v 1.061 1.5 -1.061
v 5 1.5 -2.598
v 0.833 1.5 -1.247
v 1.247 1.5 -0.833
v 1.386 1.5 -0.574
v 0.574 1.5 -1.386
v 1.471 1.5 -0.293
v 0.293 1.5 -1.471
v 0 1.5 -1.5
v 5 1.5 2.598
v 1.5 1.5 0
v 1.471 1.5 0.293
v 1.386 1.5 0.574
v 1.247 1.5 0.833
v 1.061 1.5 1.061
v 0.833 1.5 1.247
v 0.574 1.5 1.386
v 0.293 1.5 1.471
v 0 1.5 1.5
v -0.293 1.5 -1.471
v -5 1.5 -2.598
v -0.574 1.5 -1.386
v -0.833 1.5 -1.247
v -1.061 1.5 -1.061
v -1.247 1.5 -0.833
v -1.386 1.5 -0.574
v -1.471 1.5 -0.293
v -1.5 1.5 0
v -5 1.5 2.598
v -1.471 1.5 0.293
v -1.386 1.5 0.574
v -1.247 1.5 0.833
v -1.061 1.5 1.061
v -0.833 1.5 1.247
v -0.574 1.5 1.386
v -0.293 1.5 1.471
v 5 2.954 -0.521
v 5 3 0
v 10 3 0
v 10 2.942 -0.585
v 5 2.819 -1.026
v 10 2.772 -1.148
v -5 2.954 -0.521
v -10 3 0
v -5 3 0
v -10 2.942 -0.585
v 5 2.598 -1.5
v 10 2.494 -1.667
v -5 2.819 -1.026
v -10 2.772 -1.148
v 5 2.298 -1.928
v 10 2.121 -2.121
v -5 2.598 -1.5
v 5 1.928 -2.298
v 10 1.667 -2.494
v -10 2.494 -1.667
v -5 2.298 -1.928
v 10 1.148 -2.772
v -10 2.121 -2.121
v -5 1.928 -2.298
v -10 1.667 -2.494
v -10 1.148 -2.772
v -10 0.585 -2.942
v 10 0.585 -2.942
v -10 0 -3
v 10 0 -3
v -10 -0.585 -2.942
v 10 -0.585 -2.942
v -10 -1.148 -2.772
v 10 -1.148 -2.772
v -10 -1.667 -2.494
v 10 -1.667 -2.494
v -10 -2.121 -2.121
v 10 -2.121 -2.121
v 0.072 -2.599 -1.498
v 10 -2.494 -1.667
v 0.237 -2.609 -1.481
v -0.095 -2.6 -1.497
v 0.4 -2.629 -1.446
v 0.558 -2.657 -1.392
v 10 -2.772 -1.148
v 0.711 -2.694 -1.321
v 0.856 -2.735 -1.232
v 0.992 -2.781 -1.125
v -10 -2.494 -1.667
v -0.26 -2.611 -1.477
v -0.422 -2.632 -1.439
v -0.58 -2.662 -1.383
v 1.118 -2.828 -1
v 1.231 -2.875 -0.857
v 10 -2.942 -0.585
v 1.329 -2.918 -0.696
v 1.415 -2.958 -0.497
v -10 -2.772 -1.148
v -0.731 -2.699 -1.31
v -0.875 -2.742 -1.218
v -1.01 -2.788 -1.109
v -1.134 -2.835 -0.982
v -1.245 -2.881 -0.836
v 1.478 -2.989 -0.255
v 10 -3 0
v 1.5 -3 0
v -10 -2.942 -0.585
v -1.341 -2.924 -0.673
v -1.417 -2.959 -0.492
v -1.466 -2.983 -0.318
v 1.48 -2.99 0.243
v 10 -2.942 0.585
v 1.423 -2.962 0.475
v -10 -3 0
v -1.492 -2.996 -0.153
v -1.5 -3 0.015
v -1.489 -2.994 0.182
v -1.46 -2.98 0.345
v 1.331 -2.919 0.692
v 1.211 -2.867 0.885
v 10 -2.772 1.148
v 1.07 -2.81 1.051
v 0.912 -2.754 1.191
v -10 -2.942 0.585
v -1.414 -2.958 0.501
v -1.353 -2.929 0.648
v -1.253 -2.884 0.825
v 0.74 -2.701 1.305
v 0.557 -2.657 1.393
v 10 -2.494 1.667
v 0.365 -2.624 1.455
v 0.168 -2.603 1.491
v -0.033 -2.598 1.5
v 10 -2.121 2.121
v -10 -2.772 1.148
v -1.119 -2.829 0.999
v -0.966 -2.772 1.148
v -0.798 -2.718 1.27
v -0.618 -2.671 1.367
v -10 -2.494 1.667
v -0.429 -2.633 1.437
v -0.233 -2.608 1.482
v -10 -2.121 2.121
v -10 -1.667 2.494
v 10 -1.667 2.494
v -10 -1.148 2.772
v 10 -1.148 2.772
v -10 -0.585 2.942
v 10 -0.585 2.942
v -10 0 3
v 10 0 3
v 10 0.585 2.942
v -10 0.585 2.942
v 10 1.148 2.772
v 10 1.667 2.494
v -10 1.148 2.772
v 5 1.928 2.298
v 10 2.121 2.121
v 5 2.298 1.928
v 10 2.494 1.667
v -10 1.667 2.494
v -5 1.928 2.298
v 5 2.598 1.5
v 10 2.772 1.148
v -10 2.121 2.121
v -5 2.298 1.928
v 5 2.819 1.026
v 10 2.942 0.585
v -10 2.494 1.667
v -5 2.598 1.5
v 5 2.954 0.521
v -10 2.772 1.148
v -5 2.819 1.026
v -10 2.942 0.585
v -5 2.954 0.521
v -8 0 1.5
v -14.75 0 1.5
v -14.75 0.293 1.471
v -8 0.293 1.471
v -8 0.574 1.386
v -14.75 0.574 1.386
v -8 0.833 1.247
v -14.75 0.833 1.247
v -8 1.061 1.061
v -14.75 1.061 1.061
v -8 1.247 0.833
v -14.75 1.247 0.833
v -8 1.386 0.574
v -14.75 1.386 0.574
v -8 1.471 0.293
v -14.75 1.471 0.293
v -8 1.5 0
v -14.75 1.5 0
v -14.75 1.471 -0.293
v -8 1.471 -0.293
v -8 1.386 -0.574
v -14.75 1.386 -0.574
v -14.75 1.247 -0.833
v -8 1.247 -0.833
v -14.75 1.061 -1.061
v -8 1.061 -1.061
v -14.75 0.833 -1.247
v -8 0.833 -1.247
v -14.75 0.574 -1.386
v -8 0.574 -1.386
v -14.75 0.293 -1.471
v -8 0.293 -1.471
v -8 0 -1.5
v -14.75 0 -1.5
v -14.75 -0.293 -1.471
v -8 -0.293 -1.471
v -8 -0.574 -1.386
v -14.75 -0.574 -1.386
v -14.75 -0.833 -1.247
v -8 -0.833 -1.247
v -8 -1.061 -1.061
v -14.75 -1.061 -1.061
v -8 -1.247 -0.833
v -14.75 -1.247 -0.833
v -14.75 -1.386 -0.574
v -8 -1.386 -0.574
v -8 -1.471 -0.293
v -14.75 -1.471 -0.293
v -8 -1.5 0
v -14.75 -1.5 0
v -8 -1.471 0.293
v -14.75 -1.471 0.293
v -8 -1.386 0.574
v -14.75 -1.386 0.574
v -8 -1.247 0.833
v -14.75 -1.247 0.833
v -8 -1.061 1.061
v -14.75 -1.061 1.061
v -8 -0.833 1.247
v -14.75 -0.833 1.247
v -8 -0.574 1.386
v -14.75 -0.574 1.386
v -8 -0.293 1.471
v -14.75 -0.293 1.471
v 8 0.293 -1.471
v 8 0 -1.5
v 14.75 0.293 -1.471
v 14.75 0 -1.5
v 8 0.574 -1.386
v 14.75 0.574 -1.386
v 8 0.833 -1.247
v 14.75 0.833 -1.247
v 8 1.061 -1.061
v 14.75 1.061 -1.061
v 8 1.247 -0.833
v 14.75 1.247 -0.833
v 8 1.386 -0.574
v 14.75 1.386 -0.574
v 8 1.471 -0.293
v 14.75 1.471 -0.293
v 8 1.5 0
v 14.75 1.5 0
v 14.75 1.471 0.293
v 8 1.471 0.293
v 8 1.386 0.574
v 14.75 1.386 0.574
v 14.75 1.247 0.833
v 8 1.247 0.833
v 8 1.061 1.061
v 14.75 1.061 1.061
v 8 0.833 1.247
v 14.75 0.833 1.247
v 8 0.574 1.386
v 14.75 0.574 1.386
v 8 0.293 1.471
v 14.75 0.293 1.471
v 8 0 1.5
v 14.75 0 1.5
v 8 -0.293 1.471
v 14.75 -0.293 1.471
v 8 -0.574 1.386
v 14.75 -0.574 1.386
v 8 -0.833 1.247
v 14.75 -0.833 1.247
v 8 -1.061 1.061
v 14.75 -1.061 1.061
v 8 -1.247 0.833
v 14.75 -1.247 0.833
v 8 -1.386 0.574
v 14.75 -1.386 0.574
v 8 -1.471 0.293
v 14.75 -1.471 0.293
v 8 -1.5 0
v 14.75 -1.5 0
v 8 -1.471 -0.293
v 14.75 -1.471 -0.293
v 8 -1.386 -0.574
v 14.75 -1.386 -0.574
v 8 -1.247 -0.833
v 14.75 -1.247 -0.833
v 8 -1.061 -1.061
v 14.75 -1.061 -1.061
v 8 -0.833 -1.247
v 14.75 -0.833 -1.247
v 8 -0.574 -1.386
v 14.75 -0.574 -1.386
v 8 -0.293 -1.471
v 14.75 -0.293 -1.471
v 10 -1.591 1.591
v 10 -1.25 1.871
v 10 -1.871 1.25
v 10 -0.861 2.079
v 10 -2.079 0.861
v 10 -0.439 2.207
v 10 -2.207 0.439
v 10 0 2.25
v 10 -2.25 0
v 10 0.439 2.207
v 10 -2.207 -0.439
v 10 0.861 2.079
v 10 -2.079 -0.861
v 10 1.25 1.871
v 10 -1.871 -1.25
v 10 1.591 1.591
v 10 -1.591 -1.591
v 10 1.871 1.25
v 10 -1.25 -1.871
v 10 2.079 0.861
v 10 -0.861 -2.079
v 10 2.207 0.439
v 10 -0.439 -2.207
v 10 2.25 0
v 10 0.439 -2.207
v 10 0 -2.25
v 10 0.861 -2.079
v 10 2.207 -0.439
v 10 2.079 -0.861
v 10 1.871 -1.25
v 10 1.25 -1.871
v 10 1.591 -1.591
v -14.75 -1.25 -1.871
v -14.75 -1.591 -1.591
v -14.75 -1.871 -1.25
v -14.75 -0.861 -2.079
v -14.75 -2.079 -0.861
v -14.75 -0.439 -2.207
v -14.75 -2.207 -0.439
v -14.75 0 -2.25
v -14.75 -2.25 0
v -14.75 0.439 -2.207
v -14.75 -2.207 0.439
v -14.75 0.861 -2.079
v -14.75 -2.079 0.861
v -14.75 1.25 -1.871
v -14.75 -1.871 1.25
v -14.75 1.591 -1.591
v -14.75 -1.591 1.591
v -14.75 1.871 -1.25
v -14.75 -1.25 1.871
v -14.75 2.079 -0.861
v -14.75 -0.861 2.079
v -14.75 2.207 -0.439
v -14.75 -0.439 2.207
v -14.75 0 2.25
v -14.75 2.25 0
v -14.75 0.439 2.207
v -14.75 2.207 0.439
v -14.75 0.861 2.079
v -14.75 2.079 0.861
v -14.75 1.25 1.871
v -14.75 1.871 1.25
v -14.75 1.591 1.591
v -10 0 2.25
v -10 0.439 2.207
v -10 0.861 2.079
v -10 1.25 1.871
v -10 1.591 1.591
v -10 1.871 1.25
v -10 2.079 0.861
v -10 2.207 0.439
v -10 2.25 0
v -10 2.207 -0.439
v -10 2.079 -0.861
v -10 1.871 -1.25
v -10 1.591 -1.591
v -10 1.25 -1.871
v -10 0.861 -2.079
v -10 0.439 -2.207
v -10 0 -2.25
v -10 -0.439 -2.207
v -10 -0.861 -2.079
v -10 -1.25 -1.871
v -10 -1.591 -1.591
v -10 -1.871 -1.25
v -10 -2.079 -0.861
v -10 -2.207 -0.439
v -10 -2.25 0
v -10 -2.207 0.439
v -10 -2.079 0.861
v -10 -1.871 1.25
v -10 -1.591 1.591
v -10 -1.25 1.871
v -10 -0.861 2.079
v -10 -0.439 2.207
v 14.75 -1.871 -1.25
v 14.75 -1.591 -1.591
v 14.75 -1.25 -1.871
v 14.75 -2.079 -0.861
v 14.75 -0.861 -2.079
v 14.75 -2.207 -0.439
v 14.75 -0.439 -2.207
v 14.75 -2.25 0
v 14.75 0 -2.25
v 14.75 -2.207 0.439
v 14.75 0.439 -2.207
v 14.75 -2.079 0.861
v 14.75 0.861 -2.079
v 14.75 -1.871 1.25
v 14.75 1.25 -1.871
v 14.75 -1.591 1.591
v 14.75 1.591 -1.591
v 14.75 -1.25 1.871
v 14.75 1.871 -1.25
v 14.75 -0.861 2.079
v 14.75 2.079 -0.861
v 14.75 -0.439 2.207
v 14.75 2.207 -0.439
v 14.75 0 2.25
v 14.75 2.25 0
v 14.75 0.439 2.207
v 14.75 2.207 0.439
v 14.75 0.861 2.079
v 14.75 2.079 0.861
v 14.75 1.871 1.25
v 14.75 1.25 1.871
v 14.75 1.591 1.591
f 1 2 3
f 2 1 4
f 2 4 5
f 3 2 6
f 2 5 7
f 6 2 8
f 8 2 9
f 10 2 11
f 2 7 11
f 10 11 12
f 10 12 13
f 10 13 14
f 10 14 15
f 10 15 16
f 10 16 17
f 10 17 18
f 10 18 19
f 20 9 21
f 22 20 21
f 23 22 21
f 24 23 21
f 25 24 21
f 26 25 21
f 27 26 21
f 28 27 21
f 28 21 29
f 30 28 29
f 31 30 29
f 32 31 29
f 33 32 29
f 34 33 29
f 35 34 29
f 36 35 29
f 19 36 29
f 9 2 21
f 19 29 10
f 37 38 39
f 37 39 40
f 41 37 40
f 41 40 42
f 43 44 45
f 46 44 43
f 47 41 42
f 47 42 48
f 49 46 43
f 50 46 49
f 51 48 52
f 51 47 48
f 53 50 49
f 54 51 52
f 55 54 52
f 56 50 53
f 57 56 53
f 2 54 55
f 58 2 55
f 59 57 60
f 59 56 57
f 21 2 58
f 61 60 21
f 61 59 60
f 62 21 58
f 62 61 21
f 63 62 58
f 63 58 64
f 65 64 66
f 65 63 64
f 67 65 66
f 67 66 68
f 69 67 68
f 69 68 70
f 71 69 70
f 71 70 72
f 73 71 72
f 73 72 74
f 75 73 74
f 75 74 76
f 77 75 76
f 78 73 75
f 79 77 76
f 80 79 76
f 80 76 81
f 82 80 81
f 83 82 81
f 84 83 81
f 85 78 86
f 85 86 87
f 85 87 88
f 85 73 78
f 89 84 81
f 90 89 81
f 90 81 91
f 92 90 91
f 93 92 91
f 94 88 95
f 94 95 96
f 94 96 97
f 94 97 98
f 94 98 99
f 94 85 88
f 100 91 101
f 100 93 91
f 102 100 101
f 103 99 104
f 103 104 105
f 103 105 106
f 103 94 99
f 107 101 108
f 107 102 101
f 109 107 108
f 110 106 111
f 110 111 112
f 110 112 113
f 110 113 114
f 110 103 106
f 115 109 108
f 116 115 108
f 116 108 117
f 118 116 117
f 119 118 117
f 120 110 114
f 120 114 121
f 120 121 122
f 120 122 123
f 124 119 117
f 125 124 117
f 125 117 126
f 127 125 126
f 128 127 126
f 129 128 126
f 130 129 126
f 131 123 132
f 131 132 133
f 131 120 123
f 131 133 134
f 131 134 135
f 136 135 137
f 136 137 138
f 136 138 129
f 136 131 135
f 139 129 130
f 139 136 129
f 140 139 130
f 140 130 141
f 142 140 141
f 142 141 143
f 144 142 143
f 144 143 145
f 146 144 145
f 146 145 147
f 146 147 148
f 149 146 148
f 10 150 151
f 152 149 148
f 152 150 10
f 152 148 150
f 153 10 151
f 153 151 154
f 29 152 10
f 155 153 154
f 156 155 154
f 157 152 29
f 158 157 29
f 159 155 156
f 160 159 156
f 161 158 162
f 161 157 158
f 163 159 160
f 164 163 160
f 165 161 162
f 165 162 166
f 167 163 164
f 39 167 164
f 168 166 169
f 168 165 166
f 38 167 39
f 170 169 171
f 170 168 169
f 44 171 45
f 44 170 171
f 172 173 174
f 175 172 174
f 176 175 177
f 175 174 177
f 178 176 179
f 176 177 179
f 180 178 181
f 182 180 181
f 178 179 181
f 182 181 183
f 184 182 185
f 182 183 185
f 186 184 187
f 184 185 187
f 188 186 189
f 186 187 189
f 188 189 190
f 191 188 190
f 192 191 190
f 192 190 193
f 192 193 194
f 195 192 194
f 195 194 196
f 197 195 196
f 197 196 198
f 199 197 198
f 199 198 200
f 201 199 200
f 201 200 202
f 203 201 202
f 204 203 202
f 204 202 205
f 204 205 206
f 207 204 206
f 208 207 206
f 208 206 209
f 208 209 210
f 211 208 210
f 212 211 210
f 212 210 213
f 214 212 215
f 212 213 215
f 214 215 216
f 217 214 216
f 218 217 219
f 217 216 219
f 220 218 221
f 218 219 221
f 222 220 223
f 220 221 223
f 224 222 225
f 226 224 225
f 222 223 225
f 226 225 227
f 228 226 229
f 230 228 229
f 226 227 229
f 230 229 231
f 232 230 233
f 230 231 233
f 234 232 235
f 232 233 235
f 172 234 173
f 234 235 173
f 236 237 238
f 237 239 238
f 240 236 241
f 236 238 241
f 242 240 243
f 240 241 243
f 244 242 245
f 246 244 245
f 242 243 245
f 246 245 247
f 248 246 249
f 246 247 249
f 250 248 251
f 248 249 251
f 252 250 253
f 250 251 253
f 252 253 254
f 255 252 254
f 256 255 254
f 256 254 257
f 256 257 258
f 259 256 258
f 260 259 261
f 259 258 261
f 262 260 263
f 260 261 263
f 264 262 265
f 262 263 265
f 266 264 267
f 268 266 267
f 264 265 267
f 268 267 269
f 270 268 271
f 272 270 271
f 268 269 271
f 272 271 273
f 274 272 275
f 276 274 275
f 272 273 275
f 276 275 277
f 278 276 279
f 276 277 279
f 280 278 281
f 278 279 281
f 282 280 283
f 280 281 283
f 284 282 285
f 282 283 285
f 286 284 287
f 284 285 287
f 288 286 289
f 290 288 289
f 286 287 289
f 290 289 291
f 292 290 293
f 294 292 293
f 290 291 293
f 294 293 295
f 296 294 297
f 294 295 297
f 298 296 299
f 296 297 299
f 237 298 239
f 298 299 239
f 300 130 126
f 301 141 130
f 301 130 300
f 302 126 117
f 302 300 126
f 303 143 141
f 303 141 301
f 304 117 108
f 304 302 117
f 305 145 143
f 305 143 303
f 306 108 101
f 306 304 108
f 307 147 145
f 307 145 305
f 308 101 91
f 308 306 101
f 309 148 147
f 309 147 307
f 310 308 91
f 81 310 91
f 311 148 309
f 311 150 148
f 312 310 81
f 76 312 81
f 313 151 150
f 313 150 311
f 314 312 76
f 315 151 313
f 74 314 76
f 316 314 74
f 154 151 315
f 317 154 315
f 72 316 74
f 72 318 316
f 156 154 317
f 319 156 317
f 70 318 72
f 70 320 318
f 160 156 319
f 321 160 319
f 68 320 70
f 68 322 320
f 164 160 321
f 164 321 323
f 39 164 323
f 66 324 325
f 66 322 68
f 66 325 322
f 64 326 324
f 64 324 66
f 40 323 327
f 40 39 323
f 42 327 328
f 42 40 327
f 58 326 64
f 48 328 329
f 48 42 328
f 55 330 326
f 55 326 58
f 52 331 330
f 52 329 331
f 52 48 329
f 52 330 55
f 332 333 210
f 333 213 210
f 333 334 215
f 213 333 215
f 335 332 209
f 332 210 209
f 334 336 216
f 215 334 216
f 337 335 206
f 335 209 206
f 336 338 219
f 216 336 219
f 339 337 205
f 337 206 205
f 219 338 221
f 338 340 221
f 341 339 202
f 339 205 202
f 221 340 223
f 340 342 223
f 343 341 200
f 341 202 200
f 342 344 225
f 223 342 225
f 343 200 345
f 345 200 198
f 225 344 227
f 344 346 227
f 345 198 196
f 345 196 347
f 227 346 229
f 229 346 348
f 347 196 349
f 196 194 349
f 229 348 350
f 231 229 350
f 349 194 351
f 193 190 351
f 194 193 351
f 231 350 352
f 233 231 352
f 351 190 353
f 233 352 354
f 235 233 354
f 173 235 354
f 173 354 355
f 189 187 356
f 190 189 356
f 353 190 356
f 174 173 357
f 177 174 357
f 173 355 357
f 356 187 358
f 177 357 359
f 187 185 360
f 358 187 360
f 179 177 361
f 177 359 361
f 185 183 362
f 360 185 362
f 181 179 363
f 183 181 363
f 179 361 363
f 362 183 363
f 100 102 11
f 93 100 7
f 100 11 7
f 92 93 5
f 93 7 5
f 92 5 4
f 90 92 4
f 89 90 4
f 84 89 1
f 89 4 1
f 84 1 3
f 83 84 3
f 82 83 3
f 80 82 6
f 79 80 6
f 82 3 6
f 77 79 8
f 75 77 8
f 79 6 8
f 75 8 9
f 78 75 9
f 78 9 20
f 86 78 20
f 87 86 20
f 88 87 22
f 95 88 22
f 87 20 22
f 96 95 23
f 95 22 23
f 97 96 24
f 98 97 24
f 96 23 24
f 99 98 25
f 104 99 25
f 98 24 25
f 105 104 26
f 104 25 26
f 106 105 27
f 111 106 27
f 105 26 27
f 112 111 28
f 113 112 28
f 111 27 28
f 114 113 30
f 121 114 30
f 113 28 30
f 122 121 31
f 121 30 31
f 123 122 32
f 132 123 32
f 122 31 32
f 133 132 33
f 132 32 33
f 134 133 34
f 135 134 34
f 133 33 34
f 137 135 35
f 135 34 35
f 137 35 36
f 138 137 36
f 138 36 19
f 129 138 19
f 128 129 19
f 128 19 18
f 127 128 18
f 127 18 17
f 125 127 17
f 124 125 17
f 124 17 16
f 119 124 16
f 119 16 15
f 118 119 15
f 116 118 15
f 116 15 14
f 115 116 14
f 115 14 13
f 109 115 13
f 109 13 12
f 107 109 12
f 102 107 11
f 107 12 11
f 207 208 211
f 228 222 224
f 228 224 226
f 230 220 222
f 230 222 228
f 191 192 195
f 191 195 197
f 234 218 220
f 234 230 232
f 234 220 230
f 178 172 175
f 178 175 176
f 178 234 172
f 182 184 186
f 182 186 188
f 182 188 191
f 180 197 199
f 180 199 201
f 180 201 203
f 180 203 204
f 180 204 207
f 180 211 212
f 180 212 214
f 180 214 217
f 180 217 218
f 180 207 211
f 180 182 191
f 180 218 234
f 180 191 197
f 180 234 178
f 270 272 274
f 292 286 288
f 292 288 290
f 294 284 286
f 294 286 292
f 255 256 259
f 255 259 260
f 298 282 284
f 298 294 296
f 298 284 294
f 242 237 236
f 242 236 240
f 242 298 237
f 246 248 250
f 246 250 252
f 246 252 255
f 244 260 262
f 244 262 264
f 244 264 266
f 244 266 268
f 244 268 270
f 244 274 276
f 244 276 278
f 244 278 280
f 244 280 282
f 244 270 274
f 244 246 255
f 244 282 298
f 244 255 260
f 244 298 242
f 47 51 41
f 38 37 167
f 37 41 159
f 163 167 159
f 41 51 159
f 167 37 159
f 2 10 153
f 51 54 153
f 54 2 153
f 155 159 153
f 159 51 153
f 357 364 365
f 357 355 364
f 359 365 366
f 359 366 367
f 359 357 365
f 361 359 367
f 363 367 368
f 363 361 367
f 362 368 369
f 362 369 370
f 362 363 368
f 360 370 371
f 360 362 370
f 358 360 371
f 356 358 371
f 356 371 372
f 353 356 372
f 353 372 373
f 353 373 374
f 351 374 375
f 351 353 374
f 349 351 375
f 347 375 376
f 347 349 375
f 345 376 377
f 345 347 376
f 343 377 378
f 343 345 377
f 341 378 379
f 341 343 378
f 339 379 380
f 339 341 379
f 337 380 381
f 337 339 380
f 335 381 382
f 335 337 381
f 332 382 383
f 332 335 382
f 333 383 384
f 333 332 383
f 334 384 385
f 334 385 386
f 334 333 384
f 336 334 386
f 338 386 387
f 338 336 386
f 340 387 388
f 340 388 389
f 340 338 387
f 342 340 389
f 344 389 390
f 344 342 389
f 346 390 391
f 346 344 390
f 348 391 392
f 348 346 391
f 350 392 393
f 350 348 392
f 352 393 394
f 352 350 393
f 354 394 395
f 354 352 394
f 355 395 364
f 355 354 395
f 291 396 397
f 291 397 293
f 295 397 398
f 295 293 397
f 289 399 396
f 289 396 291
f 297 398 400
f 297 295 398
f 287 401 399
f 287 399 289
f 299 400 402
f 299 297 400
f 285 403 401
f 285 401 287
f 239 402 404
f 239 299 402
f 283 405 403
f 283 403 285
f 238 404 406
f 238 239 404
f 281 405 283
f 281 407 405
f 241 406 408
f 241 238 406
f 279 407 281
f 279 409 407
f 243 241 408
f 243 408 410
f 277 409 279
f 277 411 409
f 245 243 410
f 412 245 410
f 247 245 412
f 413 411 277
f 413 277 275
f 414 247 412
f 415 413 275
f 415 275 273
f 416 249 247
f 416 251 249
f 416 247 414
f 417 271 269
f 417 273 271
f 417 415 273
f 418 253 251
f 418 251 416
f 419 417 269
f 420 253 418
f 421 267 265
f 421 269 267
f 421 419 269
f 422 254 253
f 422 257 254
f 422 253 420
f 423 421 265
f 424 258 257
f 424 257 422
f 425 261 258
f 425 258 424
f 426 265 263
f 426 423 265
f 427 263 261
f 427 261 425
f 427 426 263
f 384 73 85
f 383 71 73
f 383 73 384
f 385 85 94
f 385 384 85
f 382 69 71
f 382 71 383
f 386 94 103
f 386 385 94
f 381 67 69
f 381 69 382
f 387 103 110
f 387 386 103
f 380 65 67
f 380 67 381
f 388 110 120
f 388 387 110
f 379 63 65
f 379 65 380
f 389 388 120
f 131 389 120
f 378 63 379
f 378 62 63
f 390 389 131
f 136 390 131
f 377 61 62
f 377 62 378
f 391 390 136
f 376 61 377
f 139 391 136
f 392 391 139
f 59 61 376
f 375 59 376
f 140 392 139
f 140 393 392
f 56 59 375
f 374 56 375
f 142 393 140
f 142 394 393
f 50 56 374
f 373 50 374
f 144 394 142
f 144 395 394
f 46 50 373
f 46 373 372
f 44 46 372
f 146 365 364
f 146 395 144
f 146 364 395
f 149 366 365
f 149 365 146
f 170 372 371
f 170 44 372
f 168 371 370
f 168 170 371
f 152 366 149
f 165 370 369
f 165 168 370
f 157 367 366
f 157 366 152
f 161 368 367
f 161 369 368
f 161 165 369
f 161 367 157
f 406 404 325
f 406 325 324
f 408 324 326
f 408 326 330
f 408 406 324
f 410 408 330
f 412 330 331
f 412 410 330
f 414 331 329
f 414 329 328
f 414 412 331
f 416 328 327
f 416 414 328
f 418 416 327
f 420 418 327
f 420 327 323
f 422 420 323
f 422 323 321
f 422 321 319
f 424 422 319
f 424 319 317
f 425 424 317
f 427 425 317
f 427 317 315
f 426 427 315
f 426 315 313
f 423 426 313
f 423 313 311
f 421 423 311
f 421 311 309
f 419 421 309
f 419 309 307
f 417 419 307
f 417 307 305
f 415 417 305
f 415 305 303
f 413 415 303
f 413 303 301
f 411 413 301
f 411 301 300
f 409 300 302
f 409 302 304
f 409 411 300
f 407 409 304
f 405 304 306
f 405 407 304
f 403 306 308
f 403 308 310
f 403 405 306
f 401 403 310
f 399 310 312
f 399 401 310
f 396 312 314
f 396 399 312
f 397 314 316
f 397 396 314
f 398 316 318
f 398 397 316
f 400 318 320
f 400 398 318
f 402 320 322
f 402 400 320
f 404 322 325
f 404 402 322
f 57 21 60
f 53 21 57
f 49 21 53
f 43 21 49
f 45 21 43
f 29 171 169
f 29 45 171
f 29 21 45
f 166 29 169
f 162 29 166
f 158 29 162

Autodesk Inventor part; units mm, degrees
ref_plane "YZ Plane" through (0, 0, 0) normal (1, 0, 0) x (0, 1, 0)
ref_plane "XZ Plane" through (0, 0, 0) normal (0, 1, 0) x (-1, 0, 0)
ref_plane "XY Plane" through (0, 0, 0) normal (0, 0, 1) x (1, 0, 0)
sketch "Sketch1" plane through (0, 0, 0) normal (1, 0, 0) x (0, 1, 0)
  circle A0 centre (0, 0) radius 3
  dimension "d0" = 6
extrude "Extrusion1" add sketch "Sketch1" along normal mid plane 29.5
sketch "Sketch2" plane through (14.75, 0, 0) normal (1, 0, 0) x (0, 0, -1)
  circle A0 centre (0, 0) radius 2.25
  circle A1 centre (0, 0) radius 1.5
  circle A2 centre (0, 0) radius 3
  dimension "d3" = 4.5
  dimension "d4" = 3
extrude "Extrusion2" cut sketch "Sketch2" against normal blind 4.75
sketch "Sketch3" plane through (-14.75, 0, 0) normal (-1, 0, 0) x (0, 0, 1)
  circle A0 centre (0, 0) radius 2.25
  circle A1 centre (0, 0) radius 1.5
  circle A2 centre (0, 0) radius 3
  dimension "d7" = 4.5
  dimension "d8" = 3
  dimension "d9" = 6
extrude "Extrusion3" cut sketch "Sketch3" against normal blind 4.75
sketch "Sketch4" plane through (0, 0, 0) normal (1, 0, 0) x (0, 1, 0)
  circle A0 centre (0, 0) radius 3 projected
  line L0 (3, 0) -> (1.5, 0)
  line L1 (1.5, 3.5) -> (3, 3.5)
  line L2 (3, 3.5) -> (3, -3.5)
  line L3 (3, -3.5) -> (1.5, -3.5)
  line L4 (1.5, -3.5) -> (1.5, 3.5)
  circle A1 centre (0, 0) radius 2.25 projected
  line L5 (1.5, 3.5) -> (3, -3.5) construction
  line L6 (3, 3.5) -> (1.5, -3.5) construction
  point P0 (2.25, 0)
  dimension "d12" = 1.5
  dimension "d13" = 7
extrude "Extrusion4" cut sketch "Sketch4" along normal mid plane 10 contours L0 A1 L4 A0 | L2 L3 L4 A0 | A0 L4 A1 L0 | A0 L4 L1 L2 | A1 L4 L0 | L0 L4 A1
sketch "Sketch5" plane through (-5, 1.5, -2.5981) normal (0, 1, 0) x (1, 0, 0)
  circle A0 centre (5, -2.5981) radius 1.5
  dimension "d16" = 3
extrude "Extrusion5" cut sketch "Sketch5" against normal through all
thread "Thread1" size "M3x0.5" class "6H" standard "ANSI Metric M Profile" full length
thread "Thread2" size "M3x0.5" class "6H" standard "ANSI Metric M Profile" full length
sketch "Sketch6" plane through (10, 0, 0) normal (1, 0, 0) x (0, 0, -1)
  circle A0 centre (0, 0) radius 1.5
extrude "Extrusion6" cut sketch "Sketch6" against normal blind 2
sketch "Sketch7" plane through (-10, 0, 0) normal (-1, 0, 0) x (0, 0, 1)
  circle A0 centre (0, 0) radius 1.5
extrude "Extrusion7" cut sketch "Sketch7" against normal blind 2
properties part number "Z25_Spacer" material "Aluminum 6061"
